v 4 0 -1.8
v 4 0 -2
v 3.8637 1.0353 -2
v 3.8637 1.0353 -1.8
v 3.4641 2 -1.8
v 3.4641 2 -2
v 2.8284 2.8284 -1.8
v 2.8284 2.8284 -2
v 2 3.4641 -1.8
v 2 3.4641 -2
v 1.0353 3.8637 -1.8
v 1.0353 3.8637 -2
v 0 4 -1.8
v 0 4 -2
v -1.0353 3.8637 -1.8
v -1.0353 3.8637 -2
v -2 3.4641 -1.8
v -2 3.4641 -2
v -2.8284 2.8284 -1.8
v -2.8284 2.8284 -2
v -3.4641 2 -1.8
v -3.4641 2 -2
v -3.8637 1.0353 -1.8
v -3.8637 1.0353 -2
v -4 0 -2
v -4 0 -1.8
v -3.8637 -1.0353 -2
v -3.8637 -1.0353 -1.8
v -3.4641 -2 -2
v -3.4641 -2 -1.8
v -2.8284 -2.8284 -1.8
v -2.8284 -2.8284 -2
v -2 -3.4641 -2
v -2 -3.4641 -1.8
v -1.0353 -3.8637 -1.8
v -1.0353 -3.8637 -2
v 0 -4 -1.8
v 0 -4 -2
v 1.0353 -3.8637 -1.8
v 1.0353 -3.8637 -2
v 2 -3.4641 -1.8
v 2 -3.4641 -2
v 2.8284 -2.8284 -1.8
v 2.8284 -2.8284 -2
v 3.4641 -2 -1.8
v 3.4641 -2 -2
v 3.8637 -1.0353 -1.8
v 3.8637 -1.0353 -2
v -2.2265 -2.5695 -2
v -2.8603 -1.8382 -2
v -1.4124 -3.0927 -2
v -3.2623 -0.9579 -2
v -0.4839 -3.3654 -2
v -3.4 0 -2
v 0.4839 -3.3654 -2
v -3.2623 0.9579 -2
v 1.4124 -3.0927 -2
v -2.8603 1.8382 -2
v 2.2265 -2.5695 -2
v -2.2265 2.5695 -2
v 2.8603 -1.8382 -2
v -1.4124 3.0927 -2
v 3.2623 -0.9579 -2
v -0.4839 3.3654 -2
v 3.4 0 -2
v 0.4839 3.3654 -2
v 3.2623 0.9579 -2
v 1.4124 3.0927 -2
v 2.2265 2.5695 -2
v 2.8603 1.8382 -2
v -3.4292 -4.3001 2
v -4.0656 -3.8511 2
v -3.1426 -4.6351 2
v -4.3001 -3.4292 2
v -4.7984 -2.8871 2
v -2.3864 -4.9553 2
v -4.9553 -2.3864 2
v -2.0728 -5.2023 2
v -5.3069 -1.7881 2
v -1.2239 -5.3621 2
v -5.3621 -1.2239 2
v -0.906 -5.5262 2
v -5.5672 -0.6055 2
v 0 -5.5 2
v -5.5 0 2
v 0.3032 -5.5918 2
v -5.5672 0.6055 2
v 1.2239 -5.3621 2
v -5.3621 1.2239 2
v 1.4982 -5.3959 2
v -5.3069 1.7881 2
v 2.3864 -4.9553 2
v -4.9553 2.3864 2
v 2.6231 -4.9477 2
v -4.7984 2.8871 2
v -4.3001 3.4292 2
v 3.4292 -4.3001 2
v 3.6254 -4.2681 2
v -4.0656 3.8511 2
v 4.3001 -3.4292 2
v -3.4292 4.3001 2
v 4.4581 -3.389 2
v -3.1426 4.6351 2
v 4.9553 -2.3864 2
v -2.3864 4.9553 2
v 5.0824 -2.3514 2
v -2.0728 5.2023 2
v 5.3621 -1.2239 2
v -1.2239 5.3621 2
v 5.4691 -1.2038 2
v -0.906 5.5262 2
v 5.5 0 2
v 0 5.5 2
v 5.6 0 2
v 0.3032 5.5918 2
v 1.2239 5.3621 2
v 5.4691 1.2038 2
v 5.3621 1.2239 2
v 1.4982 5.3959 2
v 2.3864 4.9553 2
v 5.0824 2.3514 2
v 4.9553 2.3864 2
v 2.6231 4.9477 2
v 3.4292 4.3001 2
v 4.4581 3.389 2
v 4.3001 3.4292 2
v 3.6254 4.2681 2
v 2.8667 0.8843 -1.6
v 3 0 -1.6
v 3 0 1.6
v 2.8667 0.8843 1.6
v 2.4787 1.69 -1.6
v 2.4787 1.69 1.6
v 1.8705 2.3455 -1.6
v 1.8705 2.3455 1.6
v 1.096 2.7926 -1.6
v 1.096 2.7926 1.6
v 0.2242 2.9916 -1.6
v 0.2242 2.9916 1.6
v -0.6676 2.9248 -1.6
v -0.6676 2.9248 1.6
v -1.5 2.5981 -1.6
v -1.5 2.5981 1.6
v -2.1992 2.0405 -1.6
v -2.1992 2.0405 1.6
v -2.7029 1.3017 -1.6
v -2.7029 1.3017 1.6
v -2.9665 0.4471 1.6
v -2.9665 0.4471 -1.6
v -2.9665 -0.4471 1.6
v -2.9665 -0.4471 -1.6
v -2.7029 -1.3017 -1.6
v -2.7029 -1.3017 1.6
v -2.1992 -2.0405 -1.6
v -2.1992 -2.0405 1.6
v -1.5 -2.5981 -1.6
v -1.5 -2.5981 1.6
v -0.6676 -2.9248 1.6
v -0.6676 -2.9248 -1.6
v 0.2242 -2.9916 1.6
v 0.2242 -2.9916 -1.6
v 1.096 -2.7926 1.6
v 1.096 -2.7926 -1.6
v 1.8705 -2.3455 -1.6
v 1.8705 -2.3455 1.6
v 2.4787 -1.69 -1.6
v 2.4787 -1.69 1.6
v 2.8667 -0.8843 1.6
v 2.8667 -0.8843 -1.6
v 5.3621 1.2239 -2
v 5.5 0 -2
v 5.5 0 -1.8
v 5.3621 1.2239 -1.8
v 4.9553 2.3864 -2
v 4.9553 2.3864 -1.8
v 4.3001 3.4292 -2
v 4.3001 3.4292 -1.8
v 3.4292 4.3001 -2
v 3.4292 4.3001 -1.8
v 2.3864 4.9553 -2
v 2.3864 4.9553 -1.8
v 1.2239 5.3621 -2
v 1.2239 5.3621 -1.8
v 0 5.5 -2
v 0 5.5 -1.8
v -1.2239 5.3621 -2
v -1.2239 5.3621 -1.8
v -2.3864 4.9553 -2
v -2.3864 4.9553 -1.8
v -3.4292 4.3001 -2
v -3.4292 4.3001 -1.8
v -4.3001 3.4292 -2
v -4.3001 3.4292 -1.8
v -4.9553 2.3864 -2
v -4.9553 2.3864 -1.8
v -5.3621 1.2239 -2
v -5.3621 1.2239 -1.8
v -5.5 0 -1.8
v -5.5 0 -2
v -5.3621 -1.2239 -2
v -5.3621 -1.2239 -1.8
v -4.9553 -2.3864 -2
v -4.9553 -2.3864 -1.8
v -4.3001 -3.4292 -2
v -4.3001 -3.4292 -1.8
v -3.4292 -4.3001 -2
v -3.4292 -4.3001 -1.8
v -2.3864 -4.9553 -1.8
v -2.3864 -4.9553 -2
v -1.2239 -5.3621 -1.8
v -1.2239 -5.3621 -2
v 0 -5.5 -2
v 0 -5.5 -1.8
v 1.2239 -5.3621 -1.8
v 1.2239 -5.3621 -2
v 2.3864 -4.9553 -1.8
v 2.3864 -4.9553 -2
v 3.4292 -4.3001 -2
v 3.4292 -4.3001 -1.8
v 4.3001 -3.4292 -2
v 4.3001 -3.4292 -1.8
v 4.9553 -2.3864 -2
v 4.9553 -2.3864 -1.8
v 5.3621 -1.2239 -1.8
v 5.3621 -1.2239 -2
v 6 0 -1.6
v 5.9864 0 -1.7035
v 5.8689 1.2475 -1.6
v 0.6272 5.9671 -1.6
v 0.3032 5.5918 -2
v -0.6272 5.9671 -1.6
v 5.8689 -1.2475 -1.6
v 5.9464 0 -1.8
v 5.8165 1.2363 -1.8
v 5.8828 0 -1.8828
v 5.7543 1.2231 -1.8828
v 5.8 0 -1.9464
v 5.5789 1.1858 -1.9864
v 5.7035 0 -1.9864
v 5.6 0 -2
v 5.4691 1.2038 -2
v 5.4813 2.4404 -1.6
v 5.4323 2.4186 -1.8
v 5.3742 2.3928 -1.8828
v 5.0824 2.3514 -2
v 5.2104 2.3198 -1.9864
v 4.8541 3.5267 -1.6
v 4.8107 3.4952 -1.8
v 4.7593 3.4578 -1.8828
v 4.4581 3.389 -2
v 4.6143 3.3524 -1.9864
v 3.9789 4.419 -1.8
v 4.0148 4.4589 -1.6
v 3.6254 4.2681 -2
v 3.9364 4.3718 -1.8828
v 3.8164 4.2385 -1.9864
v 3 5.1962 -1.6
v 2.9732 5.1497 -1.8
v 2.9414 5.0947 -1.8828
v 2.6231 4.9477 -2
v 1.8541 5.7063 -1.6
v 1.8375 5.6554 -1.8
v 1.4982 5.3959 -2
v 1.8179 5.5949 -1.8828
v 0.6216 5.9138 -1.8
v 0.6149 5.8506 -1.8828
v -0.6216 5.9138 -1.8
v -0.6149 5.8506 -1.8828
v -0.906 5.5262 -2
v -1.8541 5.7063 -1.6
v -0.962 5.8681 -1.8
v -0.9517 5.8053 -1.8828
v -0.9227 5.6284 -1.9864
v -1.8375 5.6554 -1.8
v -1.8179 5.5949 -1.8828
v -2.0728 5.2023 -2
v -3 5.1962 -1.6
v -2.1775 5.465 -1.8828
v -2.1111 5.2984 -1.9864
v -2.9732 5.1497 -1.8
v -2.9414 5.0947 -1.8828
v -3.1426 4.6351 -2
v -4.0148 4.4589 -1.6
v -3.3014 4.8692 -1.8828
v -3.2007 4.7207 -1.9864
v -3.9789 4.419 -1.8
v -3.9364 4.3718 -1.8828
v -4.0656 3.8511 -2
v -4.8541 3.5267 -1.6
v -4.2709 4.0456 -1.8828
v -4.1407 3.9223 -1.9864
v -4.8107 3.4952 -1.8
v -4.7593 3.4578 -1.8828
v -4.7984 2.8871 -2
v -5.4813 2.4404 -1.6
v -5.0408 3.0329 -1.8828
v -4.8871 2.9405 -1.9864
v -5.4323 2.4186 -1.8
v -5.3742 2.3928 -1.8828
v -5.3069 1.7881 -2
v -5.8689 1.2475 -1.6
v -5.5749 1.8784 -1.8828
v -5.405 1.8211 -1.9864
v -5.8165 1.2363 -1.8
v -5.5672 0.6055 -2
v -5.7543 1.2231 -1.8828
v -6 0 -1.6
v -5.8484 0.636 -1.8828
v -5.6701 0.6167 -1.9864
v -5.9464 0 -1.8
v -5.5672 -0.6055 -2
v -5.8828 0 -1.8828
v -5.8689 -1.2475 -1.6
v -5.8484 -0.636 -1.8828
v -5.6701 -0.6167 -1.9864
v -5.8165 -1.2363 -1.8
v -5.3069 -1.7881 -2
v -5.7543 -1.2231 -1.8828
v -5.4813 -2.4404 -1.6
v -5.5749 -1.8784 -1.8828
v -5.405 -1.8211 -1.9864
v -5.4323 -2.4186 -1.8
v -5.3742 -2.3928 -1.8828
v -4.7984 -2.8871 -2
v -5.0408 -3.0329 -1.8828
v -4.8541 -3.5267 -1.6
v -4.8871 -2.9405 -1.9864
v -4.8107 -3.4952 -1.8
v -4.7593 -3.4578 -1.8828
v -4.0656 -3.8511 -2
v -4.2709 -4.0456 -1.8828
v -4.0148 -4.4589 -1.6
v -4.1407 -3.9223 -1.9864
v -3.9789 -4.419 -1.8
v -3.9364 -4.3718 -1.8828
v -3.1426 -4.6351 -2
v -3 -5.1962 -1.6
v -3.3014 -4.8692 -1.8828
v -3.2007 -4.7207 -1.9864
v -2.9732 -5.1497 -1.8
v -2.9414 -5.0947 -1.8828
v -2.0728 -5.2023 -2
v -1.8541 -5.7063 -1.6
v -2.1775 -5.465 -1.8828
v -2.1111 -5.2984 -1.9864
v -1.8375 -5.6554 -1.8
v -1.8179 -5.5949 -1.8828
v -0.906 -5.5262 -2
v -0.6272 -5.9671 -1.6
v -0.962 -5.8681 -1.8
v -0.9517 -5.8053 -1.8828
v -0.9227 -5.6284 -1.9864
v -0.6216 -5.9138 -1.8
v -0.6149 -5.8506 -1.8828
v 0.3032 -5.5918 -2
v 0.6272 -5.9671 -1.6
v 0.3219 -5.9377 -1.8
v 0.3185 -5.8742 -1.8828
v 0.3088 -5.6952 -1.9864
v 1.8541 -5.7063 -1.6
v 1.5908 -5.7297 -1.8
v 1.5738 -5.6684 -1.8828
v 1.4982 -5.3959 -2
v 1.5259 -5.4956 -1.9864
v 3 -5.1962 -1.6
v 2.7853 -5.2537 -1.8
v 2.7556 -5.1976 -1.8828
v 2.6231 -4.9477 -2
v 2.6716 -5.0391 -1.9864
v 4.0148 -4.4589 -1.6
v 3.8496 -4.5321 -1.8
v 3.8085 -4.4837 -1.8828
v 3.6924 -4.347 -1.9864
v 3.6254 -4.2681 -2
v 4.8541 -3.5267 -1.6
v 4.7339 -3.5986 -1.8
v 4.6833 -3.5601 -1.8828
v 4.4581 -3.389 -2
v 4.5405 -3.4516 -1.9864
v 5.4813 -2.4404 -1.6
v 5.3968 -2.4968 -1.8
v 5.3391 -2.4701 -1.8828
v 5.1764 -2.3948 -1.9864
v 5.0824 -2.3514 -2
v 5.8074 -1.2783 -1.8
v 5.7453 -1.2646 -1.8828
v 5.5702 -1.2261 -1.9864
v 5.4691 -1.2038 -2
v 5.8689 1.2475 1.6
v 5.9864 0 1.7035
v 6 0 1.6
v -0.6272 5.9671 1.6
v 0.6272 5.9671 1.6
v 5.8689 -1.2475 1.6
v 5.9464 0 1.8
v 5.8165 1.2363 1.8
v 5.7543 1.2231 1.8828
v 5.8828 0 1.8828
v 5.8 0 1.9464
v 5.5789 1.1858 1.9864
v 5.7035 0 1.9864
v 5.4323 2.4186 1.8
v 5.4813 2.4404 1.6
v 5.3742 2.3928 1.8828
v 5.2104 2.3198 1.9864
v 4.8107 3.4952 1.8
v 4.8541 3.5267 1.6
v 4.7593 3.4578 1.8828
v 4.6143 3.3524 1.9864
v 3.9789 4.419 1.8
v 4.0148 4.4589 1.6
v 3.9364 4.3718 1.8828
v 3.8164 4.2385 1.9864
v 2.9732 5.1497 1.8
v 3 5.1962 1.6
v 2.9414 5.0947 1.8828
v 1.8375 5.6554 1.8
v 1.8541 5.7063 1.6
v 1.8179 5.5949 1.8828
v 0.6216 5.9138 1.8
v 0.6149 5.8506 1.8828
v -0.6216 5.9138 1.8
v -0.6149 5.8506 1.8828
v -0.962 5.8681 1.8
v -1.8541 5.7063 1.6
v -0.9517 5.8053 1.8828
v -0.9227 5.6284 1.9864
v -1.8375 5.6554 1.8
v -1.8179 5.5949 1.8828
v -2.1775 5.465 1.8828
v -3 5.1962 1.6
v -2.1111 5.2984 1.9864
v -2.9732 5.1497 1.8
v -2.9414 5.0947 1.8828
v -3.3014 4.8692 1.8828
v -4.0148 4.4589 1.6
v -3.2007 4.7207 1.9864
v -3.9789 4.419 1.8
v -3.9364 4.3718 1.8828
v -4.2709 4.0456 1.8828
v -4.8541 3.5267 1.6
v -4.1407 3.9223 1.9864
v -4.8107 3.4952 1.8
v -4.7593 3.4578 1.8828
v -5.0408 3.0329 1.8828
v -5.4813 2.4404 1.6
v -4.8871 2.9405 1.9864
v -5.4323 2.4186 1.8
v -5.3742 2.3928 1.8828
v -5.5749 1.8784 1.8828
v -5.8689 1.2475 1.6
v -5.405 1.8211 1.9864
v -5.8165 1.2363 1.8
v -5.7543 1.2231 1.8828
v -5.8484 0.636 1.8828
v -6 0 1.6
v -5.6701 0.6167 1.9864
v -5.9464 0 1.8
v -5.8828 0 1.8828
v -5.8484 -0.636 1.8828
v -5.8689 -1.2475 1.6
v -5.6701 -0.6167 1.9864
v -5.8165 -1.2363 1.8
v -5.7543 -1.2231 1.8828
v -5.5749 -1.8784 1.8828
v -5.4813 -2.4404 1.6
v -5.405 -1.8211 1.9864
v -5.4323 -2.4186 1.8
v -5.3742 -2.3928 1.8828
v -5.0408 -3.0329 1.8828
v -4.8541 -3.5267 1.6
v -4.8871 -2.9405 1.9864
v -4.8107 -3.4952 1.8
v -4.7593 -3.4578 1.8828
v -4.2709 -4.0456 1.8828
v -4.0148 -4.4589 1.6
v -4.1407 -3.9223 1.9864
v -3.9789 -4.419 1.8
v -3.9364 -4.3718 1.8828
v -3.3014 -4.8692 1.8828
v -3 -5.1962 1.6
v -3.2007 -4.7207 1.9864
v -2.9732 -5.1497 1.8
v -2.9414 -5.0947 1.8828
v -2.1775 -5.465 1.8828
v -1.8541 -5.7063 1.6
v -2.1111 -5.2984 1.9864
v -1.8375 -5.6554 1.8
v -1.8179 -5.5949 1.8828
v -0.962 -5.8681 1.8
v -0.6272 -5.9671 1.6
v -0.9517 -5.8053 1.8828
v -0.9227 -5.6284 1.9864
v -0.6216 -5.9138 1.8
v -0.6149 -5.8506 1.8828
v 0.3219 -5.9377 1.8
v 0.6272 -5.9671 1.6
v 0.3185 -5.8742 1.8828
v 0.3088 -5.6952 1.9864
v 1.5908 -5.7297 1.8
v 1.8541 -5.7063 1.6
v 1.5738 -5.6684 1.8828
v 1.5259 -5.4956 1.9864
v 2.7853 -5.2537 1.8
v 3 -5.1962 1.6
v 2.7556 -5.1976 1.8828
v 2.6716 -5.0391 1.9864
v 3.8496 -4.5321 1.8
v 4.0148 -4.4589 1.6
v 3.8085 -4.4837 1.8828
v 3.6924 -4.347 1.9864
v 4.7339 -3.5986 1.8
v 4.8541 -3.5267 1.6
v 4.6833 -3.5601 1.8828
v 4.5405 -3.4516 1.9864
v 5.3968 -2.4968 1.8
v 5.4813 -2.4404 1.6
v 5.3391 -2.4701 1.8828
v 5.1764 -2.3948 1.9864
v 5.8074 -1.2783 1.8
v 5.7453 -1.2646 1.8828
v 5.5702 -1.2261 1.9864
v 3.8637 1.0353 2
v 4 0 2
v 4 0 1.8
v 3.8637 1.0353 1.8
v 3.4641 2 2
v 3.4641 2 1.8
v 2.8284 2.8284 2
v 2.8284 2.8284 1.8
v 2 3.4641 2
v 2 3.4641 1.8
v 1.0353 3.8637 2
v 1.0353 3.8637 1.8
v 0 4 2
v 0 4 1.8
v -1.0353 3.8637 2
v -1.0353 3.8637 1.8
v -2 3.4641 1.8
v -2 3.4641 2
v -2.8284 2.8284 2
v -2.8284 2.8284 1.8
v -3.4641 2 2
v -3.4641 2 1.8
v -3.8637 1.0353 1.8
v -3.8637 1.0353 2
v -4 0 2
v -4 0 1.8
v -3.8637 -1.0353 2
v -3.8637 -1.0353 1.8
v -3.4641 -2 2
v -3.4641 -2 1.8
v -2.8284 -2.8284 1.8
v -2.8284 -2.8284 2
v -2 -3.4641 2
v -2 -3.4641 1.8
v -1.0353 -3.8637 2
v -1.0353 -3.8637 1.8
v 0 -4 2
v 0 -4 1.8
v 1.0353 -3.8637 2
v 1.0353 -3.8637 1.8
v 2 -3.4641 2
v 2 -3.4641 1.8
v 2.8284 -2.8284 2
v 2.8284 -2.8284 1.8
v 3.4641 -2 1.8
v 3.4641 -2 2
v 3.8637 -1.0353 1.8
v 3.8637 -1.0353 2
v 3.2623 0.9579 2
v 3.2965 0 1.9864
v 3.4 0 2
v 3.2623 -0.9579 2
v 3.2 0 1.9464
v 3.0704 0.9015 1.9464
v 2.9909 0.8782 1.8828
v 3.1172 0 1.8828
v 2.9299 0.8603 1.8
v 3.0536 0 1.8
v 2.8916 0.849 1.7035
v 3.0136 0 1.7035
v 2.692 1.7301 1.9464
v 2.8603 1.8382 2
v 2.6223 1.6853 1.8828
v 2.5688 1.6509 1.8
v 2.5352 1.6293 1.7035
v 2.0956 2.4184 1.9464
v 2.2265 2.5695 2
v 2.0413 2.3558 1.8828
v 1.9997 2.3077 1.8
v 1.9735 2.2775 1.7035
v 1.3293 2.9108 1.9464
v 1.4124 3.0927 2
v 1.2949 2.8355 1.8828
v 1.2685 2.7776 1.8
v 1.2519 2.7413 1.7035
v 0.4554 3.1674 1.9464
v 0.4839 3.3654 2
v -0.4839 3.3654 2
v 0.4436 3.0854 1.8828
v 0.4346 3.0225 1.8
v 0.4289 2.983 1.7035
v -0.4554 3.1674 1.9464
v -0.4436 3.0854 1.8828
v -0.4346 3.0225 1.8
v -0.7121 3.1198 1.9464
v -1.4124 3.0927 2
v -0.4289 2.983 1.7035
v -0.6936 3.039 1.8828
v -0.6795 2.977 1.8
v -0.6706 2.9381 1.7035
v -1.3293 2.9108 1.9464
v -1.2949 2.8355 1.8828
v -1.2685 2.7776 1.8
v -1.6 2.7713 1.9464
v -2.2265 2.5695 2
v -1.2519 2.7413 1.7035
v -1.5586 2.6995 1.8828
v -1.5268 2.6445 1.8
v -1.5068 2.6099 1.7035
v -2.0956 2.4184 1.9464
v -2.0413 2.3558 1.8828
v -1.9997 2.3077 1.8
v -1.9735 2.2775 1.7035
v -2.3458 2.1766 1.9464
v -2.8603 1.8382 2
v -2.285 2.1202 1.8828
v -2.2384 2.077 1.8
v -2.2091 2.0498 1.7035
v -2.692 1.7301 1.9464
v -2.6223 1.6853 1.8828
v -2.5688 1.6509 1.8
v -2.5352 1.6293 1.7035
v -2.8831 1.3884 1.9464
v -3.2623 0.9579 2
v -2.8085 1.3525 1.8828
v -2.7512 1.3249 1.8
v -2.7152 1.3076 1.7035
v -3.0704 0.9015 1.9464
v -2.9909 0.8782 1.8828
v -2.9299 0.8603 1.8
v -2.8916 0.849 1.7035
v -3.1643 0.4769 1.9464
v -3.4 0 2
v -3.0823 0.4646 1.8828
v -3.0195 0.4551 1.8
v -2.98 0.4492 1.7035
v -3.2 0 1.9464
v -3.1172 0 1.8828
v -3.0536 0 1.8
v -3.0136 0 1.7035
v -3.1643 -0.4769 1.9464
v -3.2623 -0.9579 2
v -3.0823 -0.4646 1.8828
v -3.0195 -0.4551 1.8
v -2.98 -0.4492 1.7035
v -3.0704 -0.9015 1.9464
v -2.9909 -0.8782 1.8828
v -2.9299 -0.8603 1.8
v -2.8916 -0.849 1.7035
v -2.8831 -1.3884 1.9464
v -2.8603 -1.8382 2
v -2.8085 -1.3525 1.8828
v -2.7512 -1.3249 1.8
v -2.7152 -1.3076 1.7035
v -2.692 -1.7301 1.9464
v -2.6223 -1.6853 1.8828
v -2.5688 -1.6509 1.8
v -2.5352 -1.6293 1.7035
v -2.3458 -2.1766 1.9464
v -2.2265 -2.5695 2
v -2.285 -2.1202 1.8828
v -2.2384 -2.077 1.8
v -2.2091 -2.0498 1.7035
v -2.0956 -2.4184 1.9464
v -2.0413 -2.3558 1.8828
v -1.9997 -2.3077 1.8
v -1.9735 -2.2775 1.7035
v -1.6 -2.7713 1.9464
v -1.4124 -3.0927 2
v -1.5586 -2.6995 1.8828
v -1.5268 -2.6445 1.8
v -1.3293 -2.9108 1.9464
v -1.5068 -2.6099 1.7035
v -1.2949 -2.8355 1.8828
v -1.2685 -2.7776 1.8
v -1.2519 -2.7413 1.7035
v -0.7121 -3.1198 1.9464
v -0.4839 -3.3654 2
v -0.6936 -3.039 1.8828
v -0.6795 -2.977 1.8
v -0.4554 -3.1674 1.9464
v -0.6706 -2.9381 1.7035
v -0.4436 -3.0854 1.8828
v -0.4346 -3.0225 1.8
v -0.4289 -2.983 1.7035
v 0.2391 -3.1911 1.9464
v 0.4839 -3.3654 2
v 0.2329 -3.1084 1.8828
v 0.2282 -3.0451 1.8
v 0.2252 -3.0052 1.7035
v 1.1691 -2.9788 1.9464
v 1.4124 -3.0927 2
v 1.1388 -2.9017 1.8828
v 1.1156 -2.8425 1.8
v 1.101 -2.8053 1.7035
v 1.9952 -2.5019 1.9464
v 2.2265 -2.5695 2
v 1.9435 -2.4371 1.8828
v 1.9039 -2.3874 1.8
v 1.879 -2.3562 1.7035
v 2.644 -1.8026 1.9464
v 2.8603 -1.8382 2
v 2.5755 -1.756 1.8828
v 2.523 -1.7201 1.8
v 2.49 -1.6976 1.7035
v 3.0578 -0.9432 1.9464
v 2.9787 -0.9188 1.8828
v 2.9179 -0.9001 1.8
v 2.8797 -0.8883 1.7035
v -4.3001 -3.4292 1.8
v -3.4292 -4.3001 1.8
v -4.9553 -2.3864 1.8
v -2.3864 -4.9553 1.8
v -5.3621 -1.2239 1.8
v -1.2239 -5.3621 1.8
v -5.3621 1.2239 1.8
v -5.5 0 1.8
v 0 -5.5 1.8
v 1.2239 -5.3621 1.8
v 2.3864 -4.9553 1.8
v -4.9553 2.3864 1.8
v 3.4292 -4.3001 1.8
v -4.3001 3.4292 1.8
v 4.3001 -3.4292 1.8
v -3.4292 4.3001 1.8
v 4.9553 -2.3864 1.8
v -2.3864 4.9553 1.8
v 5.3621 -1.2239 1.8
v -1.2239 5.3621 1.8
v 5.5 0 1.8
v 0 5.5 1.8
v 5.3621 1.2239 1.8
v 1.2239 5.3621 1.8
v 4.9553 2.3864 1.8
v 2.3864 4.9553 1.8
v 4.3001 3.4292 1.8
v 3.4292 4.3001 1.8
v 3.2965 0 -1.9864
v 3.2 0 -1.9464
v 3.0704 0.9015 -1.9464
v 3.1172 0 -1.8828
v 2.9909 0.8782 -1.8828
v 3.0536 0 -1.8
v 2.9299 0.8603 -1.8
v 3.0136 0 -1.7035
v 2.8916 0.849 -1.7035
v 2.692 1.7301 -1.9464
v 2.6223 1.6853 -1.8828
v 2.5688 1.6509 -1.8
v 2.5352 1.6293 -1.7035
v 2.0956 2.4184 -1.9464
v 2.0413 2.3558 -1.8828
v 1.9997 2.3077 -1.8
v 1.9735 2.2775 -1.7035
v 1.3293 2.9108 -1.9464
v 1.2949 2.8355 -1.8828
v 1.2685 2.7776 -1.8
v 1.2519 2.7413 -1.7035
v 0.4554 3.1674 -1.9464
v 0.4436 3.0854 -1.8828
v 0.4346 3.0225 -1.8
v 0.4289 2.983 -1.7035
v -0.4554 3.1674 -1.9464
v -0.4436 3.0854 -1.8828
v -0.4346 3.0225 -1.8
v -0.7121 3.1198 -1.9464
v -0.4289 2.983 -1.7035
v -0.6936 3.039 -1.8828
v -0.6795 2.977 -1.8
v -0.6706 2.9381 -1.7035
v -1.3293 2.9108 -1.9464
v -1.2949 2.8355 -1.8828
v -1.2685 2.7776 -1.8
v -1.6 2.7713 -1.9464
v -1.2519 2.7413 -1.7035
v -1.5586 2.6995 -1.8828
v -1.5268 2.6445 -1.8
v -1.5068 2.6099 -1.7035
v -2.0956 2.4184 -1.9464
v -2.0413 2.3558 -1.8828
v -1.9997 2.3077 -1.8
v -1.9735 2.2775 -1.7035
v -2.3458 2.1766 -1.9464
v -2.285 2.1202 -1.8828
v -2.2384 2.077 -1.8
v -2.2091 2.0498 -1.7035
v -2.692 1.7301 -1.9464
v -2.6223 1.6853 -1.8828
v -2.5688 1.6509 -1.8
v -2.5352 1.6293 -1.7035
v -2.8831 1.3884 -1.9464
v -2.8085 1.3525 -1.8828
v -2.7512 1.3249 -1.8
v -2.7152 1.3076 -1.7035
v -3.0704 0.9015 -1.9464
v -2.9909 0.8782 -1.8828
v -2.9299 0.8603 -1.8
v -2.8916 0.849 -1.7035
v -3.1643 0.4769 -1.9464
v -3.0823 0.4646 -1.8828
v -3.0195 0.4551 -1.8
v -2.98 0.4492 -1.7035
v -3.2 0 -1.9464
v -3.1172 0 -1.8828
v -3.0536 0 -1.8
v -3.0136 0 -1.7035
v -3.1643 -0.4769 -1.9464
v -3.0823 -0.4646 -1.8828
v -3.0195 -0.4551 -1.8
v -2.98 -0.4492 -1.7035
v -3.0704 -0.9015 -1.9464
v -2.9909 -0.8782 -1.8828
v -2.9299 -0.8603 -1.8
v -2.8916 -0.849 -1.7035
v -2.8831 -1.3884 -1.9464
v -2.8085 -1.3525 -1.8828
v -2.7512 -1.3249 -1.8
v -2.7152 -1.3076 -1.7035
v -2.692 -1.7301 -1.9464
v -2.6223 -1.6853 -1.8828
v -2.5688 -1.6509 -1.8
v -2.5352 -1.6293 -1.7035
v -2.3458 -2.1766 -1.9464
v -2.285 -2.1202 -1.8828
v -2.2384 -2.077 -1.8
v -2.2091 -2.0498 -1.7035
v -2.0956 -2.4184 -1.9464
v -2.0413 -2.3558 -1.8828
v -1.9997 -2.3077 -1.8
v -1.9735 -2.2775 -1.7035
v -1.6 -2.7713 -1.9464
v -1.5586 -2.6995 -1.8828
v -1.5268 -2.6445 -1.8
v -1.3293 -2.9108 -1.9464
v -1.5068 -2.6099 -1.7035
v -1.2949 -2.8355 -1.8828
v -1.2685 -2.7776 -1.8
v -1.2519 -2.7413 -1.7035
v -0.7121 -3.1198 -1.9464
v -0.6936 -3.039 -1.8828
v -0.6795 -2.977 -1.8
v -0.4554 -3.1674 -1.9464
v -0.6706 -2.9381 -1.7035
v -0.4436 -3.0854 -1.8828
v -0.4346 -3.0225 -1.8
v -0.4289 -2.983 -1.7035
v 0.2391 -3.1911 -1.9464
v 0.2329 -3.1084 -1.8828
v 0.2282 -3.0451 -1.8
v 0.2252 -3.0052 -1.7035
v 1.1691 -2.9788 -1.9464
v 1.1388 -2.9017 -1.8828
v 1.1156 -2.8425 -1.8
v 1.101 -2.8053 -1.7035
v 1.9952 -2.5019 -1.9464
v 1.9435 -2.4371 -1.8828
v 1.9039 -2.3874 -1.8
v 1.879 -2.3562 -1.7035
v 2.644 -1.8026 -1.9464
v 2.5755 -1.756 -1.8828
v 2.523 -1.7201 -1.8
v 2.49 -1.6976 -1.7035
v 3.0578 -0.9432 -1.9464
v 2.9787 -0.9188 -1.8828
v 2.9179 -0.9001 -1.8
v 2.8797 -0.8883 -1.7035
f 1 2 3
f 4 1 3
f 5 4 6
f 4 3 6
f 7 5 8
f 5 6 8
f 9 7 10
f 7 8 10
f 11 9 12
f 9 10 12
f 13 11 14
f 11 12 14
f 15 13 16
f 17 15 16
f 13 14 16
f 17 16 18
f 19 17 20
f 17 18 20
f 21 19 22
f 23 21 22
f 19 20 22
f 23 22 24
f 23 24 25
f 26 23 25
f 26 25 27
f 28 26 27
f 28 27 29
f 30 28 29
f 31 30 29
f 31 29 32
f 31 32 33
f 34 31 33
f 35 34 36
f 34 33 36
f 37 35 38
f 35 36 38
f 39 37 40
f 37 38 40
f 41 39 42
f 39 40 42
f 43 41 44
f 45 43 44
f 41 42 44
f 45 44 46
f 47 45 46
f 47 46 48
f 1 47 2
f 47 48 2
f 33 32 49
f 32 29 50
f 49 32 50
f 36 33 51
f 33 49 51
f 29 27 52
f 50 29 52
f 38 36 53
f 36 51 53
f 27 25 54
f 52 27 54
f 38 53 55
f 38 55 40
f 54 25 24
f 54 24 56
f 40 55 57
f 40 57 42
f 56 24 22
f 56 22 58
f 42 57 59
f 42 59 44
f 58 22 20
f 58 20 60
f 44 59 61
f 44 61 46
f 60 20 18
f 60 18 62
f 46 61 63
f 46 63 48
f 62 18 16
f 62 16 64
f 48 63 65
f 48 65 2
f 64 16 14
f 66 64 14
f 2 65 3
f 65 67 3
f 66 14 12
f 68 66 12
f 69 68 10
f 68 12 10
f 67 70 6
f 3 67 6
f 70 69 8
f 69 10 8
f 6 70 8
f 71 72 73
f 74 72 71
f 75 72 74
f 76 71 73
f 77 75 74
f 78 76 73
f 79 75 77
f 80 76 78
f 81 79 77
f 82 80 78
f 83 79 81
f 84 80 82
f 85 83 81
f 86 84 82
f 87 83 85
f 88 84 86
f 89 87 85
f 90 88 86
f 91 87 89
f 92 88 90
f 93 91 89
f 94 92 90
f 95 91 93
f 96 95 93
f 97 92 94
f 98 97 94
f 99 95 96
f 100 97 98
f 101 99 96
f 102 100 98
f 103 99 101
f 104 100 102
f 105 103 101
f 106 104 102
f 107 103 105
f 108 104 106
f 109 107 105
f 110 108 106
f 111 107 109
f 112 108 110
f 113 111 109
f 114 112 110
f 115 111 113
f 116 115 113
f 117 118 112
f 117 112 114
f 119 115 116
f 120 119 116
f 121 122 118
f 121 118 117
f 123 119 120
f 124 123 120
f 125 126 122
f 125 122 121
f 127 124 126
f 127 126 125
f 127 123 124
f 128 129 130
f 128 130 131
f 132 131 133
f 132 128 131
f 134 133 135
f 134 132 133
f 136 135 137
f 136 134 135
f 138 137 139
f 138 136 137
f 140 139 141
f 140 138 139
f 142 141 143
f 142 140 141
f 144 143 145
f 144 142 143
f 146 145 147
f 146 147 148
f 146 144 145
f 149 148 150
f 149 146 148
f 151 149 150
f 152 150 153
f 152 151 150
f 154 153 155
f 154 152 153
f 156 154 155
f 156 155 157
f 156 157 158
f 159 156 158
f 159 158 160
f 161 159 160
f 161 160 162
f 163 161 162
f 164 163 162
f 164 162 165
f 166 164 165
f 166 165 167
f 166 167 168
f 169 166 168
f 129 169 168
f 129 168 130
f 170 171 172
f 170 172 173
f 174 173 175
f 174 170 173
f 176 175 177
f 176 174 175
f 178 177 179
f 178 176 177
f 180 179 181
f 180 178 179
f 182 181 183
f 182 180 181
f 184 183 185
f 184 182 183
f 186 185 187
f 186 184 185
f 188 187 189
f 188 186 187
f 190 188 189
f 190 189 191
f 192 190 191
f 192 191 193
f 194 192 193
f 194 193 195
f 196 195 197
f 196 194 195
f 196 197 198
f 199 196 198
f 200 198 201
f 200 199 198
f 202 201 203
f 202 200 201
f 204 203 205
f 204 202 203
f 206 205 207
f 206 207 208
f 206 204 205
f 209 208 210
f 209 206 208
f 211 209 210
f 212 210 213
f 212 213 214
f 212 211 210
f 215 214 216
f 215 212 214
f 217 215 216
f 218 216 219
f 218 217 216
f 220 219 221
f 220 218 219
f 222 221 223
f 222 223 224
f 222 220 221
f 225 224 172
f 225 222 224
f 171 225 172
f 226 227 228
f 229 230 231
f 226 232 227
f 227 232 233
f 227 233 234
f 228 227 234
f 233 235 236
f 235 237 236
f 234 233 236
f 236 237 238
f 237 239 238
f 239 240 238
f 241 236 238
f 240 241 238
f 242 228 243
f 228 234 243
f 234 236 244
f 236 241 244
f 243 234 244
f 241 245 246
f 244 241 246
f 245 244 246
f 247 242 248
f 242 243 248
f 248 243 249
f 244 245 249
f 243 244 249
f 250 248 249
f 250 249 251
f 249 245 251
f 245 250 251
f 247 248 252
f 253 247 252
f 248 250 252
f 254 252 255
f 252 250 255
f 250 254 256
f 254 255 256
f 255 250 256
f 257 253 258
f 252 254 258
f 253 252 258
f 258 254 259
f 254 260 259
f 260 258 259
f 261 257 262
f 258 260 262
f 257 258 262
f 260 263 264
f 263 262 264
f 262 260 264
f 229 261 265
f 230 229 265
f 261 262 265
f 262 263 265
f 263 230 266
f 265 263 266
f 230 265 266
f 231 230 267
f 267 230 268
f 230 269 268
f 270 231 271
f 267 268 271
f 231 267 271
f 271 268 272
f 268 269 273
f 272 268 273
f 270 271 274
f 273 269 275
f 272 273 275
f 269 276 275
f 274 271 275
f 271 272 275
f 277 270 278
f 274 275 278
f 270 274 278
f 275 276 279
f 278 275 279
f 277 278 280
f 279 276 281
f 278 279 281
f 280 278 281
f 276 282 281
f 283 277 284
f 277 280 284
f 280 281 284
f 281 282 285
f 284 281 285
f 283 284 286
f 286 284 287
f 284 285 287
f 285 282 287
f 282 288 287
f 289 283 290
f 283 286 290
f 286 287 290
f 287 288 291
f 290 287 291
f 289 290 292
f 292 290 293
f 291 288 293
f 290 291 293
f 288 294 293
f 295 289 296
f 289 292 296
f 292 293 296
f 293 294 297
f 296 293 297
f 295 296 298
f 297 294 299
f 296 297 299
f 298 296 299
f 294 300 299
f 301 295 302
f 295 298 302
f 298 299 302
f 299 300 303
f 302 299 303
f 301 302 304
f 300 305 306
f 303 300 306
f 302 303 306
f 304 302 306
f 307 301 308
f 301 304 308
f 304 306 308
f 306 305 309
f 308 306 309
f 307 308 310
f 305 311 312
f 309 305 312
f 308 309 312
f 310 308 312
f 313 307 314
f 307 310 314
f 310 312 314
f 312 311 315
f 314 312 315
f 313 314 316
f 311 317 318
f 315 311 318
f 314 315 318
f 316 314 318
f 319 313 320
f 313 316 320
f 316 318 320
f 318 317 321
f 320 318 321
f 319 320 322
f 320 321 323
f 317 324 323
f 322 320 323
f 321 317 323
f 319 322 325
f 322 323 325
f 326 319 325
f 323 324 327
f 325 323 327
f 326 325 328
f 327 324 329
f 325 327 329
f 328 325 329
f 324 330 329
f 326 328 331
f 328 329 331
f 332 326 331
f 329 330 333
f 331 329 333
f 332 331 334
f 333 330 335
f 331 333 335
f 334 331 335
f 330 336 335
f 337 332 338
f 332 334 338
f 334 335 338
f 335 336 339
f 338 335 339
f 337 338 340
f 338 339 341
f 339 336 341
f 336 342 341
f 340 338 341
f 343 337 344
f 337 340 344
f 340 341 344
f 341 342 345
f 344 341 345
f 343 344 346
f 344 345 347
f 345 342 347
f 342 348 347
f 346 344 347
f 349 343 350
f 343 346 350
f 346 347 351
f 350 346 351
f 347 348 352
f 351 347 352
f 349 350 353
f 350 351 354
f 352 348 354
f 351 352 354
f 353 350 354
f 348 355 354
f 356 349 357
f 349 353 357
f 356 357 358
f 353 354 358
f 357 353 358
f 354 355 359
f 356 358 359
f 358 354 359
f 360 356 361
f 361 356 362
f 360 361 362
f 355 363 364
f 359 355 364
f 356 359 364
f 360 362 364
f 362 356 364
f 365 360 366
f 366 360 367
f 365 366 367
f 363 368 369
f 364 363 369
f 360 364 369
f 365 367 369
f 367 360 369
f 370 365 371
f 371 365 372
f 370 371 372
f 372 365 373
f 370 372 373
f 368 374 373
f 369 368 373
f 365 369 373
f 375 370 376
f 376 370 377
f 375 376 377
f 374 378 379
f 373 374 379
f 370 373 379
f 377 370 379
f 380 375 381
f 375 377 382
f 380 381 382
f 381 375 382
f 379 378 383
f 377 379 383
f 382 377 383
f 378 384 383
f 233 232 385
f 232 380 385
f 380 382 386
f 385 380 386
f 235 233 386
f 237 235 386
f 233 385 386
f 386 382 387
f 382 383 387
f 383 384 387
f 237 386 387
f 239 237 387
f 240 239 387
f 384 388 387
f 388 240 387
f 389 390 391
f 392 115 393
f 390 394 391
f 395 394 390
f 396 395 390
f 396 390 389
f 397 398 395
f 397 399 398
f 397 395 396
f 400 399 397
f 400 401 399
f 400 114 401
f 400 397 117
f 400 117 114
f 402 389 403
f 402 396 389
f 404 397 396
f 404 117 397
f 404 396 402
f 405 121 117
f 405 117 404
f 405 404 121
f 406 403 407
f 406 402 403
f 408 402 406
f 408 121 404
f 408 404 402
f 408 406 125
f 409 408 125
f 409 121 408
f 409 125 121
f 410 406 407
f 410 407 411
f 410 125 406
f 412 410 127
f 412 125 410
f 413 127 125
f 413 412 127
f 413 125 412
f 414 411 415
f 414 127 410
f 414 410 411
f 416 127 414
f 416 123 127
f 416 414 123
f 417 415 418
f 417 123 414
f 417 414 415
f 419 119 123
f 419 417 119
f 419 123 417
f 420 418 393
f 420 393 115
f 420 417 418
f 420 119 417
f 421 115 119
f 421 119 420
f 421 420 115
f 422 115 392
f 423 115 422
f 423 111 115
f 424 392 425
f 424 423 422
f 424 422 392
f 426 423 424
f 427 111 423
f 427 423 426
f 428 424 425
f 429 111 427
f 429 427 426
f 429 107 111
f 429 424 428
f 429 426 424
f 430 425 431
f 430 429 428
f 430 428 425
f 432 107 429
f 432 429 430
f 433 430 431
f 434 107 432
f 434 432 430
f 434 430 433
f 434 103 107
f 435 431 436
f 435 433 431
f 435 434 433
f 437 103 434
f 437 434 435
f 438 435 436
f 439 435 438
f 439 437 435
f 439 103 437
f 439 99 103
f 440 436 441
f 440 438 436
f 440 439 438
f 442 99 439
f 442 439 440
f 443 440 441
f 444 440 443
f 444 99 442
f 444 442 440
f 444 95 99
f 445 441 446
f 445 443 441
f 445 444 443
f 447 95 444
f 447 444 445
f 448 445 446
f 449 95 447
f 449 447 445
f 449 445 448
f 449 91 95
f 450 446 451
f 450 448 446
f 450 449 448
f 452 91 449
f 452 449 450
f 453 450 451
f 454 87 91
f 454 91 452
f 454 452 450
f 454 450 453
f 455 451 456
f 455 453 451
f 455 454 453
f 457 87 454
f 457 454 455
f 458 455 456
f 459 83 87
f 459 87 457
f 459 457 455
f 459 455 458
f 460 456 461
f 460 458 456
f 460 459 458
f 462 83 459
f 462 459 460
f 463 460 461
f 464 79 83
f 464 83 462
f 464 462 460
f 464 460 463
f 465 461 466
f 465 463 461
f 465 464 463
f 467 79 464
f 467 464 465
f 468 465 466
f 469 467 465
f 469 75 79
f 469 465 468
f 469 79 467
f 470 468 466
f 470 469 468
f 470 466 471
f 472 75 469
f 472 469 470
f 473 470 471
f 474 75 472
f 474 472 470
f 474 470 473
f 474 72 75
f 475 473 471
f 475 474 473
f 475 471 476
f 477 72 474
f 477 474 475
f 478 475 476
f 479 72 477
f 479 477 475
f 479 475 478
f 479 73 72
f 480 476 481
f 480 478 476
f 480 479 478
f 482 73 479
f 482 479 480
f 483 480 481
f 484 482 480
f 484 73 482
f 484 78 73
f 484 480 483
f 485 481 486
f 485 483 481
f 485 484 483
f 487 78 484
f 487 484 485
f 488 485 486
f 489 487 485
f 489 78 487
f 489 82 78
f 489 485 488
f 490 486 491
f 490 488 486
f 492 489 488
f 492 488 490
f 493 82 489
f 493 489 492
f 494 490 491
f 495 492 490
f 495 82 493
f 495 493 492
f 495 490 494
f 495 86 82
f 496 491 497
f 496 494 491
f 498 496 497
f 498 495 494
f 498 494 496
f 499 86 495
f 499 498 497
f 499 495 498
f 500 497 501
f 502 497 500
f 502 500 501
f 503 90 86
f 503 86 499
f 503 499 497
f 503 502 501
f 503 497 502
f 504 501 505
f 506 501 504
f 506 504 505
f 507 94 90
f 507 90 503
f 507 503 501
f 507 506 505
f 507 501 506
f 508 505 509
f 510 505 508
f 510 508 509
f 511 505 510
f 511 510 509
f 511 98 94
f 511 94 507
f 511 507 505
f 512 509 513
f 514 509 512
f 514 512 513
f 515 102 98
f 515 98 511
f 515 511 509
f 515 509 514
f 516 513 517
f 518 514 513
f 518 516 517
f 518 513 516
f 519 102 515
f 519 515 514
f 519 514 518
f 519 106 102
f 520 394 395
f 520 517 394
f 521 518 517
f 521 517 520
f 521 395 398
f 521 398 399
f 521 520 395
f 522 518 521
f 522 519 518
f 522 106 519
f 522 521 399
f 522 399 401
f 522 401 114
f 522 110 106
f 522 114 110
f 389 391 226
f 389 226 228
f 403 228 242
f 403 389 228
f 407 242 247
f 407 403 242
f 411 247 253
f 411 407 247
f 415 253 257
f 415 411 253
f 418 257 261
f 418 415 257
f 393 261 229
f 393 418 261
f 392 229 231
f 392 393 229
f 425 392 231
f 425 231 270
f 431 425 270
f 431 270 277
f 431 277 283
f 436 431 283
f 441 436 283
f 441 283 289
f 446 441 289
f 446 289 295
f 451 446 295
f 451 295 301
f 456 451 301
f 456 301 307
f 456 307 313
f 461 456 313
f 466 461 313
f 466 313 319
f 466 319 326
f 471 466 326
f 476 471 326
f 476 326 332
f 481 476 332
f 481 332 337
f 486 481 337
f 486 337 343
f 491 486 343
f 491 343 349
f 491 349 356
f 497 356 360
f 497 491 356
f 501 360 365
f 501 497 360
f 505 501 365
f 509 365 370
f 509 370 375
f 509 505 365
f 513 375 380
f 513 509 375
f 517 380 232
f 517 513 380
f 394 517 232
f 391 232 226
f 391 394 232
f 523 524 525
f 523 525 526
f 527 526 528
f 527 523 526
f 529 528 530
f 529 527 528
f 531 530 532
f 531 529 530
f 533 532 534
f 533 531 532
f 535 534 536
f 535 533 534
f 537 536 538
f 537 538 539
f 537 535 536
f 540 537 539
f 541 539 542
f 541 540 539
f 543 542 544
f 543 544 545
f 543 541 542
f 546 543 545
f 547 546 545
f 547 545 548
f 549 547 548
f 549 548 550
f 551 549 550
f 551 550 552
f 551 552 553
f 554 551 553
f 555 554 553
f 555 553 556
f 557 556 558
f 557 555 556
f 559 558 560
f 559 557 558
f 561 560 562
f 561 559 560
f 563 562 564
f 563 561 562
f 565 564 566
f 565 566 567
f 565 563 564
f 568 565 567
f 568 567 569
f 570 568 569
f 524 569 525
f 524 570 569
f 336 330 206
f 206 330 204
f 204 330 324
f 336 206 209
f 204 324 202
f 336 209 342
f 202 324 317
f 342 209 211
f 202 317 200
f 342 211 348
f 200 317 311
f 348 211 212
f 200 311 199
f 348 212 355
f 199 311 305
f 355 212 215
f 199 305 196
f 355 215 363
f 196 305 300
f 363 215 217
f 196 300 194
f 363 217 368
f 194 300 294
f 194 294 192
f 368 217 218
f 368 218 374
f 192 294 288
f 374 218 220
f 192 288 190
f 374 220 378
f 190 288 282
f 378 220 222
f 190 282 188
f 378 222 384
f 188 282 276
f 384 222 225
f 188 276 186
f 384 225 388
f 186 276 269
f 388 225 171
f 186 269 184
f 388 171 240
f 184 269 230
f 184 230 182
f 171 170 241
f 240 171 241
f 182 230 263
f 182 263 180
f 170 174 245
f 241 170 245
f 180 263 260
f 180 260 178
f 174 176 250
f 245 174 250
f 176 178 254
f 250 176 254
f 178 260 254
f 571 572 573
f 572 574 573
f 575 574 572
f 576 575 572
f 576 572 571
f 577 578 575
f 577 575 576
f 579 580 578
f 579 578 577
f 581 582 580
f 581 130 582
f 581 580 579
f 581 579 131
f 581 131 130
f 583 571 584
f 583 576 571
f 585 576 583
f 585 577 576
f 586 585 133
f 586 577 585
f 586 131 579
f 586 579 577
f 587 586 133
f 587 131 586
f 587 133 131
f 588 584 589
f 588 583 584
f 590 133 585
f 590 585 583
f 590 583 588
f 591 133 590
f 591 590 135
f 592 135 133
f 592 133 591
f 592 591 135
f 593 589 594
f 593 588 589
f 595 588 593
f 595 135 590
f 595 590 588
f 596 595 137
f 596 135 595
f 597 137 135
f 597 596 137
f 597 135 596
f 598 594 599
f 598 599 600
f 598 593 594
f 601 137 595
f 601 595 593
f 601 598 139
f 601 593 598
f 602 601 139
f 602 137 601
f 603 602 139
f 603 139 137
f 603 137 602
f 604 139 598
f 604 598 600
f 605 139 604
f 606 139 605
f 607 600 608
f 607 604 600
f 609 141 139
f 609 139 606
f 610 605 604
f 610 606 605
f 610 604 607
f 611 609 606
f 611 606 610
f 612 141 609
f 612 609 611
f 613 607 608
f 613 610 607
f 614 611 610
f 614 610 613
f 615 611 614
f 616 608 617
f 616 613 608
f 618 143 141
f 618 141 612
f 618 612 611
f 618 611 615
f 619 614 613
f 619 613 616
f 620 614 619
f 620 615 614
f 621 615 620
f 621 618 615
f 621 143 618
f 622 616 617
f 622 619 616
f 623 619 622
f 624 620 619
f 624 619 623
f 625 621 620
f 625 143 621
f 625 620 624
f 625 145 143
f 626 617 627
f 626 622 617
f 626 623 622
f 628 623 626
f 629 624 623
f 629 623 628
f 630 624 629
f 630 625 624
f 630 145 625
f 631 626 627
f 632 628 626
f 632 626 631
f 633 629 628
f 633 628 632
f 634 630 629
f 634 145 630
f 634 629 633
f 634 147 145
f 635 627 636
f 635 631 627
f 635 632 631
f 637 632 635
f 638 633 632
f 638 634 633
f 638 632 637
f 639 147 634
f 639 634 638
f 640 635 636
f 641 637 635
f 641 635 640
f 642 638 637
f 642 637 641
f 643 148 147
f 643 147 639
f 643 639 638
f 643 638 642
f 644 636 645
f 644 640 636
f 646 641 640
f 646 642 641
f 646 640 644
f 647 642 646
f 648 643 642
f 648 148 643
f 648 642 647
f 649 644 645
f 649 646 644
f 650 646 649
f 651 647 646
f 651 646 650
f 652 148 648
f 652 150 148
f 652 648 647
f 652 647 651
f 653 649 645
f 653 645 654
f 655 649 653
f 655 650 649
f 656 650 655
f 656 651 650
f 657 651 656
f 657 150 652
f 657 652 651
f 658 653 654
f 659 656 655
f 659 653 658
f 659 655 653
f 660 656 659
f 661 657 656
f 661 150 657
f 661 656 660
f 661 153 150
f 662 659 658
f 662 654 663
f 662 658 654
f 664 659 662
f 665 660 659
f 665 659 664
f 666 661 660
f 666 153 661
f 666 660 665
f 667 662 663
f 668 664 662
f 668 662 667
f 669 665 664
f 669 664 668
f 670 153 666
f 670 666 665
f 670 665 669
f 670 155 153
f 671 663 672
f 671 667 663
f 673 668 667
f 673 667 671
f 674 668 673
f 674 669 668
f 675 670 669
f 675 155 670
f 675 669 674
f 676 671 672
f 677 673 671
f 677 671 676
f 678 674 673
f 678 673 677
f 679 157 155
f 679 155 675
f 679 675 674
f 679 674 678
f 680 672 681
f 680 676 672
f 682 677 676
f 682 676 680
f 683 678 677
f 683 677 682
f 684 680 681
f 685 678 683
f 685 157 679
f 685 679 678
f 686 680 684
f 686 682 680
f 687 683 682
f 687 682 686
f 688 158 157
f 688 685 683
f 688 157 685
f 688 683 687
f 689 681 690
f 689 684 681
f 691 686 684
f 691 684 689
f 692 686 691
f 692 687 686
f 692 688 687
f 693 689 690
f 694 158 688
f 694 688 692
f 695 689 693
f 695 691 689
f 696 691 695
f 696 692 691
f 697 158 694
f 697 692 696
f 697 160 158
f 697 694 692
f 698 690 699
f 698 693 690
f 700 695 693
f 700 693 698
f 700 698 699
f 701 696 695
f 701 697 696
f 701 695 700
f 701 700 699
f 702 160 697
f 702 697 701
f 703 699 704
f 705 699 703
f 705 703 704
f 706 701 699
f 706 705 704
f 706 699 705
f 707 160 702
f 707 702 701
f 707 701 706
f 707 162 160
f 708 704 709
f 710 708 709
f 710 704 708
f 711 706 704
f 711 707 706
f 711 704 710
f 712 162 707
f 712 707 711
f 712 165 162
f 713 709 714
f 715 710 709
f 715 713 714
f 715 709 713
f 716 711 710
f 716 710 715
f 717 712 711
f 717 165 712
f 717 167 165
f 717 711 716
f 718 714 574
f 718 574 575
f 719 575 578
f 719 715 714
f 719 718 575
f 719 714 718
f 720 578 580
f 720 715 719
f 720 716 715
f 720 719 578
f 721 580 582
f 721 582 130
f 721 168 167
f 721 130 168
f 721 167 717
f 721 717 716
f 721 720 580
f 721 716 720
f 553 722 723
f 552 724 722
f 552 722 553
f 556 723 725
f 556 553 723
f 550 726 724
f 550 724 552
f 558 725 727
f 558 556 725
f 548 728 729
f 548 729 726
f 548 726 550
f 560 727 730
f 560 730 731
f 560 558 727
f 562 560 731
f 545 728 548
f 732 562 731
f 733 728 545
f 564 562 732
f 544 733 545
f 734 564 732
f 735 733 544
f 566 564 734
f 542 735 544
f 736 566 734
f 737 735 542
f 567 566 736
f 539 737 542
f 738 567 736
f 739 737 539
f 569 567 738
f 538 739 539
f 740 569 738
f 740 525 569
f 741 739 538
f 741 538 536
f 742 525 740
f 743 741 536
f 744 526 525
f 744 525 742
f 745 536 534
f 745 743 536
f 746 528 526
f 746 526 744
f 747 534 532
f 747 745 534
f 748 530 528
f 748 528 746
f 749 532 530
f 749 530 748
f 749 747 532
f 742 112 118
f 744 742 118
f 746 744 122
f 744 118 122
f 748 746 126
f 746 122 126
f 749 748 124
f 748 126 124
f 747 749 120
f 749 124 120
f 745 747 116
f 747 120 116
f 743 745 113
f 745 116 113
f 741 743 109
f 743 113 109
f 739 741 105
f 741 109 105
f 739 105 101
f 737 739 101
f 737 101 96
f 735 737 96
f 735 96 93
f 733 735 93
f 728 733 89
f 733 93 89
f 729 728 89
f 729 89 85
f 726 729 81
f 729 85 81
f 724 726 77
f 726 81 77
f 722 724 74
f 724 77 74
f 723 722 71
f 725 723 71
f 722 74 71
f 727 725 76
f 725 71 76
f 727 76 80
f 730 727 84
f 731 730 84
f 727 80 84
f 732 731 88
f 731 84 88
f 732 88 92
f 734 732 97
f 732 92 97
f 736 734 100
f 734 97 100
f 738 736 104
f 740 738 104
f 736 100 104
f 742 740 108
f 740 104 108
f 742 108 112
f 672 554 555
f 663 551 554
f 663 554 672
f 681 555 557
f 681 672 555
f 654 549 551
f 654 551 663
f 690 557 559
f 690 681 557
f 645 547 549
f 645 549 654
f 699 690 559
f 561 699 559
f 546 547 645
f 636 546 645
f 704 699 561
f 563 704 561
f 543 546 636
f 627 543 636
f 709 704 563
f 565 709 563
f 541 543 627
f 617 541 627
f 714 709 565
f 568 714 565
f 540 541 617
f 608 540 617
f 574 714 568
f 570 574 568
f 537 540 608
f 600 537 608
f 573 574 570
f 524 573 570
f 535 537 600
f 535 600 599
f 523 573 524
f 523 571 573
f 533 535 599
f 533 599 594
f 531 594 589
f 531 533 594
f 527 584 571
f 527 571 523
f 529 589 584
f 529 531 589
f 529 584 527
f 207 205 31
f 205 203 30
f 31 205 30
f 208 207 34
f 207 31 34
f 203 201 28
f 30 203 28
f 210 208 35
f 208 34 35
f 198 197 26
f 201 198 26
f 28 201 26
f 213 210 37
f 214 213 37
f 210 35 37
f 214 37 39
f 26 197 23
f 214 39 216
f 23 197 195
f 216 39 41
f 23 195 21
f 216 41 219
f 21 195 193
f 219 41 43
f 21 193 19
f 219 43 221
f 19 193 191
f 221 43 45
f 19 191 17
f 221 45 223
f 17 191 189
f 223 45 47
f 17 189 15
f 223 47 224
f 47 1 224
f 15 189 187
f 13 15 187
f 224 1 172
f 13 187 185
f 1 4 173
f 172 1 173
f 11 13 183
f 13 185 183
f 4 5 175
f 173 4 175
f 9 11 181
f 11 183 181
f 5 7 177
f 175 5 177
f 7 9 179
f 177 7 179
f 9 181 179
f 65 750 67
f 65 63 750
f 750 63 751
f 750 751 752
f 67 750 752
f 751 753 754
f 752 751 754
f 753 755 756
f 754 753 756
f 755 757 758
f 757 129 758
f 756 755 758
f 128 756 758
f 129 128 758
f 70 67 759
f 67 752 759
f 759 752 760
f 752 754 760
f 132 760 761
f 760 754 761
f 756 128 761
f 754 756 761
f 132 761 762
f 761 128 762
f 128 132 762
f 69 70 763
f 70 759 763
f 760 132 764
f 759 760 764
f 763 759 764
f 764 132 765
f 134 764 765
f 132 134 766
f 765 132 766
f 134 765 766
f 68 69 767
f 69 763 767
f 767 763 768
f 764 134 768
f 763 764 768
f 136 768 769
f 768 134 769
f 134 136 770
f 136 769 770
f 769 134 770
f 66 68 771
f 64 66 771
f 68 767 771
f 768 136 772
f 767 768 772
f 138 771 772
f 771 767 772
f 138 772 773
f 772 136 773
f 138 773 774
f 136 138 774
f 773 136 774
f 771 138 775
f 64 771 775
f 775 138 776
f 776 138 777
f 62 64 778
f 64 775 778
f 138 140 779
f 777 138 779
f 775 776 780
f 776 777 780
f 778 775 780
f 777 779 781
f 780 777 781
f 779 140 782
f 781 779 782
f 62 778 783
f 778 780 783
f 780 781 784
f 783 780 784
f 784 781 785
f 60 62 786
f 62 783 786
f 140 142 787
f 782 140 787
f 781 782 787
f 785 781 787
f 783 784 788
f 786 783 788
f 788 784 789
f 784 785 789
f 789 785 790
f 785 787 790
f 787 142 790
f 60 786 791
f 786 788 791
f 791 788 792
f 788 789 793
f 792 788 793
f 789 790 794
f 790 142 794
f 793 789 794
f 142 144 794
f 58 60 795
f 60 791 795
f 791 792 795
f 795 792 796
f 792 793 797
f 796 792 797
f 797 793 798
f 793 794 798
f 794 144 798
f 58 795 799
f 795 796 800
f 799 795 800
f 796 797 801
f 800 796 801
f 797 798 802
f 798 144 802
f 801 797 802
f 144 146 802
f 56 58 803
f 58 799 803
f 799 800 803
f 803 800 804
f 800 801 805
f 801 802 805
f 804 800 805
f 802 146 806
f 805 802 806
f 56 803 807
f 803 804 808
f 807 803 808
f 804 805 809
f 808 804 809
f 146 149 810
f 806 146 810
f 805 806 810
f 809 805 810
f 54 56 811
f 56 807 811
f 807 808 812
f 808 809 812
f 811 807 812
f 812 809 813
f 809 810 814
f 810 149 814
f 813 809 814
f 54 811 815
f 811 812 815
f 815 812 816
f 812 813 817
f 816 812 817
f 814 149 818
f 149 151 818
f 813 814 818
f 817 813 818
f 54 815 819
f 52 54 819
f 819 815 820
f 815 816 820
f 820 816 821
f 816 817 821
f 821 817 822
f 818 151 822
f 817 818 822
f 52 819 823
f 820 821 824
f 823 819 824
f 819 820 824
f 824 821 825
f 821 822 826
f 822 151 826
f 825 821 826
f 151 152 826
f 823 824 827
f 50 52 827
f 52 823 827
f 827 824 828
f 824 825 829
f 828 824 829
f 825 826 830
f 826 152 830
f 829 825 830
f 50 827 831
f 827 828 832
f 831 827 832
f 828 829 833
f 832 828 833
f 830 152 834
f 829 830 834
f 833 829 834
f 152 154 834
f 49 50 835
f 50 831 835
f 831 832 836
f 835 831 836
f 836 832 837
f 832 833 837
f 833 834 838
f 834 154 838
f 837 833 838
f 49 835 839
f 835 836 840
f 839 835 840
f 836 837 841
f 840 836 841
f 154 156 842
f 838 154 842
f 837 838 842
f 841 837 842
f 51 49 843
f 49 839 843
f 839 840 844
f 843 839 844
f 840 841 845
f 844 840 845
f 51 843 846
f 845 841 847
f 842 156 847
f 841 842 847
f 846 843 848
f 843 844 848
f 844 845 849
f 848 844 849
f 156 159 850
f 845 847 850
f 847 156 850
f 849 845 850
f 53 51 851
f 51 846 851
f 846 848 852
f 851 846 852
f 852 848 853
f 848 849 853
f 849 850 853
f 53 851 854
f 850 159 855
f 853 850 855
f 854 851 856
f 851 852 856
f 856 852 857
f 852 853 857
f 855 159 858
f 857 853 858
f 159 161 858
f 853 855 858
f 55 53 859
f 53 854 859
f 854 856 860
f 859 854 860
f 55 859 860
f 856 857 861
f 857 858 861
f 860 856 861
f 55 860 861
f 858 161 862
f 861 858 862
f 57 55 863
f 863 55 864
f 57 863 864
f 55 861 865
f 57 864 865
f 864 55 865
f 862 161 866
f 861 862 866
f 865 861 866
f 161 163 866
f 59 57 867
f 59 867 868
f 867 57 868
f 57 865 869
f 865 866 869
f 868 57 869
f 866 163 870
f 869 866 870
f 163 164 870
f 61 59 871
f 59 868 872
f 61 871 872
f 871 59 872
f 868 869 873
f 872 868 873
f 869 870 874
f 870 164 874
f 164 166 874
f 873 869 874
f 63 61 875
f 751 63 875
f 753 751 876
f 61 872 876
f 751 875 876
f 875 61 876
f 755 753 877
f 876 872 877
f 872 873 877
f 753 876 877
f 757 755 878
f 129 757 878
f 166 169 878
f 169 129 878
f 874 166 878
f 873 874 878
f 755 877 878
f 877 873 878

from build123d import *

# Parameters (mm, degrees)
SKETCH1_R           = 6
SKETCH1_R_2         = 3
BOSS_EXTRUDE1_DEPTH = 2
SKETCH2_R           = 5.5
SKETCH2_R_2         = 4
CUT_EXTRUDE1_DEPTH  = 0.2
FILLET1_R           = 0.4


with BuildPart() as part:
    # Sketch1 → Boss-Extrude1 (new body, symmetric)
    with BuildSketch(Plane.XY):
        Circle(SKETCH1_R)
        Circle(SKETCH1_R_2, mode=Mode.SUBTRACT)
    extrude(amount=BOSS_EXTRUDE1_DEPTH, both=True)

    # Sketch2 → Cut-Extrude1 (cut)
    with BuildSketch(Plane.XY.offset(2)):
        Circle(SKETCH2_R)
        Circle(SKETCH2_R_2, mode=Mode.SUBTRACT)
    cut_extrude1 = extrude(amount=-CUT_EXTRUDE1_DEPTH, mode=Mode.SUBTRACT)

    # Mirror1: Cut-Extrude1 across plane
    add(cut_extrude1.mirror(Plane.XY), mode=Mode.SUBTRACT)

    # Fillet1
    fillet1_edges = [part.edges().sort_by_distance(p)[0] for p in [
        (-6, 0, -2),
        (-6, 0, 2),
        (-3, 0, -2),
        (-3, 0, 2),
    ]]
    fillet(fillet1_edges, radius=FILLET1_R)


solid = part.part
